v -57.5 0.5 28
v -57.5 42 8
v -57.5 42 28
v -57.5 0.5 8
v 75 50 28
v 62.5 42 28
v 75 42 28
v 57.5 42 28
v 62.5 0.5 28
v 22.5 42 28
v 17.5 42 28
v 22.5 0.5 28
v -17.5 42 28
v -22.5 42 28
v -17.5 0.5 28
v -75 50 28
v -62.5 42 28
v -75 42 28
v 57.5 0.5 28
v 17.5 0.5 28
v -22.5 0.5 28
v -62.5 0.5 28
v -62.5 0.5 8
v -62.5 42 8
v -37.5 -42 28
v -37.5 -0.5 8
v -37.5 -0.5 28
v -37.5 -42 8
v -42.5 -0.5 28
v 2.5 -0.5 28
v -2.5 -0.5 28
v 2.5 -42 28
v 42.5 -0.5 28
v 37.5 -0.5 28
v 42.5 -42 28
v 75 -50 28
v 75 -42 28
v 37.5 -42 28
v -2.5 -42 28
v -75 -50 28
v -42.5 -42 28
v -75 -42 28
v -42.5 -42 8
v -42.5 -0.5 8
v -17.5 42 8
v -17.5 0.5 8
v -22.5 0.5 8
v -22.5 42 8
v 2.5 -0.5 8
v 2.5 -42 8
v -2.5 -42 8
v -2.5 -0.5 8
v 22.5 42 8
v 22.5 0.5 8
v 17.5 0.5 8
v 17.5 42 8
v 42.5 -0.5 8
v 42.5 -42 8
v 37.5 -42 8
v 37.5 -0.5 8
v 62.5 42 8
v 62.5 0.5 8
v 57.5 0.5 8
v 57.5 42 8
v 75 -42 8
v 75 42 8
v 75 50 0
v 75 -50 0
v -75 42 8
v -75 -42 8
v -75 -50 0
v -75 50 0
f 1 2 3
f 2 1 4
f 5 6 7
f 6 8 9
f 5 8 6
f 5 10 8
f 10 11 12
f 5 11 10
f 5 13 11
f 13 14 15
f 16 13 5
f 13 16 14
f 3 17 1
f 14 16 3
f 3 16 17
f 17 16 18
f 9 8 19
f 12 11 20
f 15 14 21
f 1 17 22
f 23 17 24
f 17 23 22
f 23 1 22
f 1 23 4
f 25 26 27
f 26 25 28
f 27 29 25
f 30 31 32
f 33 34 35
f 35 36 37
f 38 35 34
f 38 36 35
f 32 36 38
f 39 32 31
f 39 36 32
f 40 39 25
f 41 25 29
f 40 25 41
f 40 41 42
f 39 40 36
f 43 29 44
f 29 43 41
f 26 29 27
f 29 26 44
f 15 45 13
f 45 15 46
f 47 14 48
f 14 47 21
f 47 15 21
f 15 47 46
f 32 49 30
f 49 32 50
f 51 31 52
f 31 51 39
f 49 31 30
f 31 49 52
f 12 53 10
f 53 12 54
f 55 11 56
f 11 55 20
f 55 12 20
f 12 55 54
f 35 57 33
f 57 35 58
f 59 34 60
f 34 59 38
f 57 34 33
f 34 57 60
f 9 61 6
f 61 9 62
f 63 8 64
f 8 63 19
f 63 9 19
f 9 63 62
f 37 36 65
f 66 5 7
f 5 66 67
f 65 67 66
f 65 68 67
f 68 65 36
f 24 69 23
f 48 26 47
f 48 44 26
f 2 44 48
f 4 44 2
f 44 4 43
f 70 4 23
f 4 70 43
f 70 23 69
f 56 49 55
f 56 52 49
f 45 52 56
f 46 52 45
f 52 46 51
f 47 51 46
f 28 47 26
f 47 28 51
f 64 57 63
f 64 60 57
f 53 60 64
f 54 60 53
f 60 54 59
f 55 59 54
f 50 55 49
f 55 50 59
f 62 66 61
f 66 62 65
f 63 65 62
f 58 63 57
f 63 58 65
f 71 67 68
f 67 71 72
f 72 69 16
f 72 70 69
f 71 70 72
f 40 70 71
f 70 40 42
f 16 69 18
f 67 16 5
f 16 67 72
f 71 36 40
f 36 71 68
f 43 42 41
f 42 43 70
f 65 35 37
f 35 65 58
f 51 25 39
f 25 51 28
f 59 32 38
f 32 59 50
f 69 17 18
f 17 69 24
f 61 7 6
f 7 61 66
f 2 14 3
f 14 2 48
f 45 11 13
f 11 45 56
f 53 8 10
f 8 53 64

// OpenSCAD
$fn = 32;

// ----------------------------------------------------------------------
// Rib frame 150 x 100 x 28
// 7 ribs at 20 mm pitch, staggered
// ----------------------------------------------------------------------

// --- parameters (mm) ---
frame = [150, 100, 8];  // base plate size (x, y, z)
rail_w = 8;             // side rail width
ribs = 7;               // number of ribs
rib_t = 5;              // rib thickness
rib_h = 20;             // rib height above the base plate
pitch = 20;             // pitch between rib centres

// --- derived feature positions (mm) ---
span = (ribs - 1) * pitch;          // = 120   distance between the outer ribs
origin_x = -span / 2;               // = -60   X of the first rib
rib_len = frame[1] / 2 - rail_w + 0.5;  // = 42.5   length of a staggered rib
rib_y = 0.5 + rib_len / 2;          // = 21.75   Y of a staggered rib centre
row_offset = 2 * rib_y;             // = 43.5   distance between the two rows
feature_centers = [
  [origin_x + 0 * pitch, rib_y],
  [origin_x + 1 * pitch, -rib_y],
  [origin_x + 2 * pitch, rib_y],
  [origin_x + 3 * pitch, -rib_y],
  [origin_x + 4 * pitch, rib_y],
  [origin_x + 5 * pitch, -rib_y],
  [origin_x + 6 * pitch, rib_y]
];   // rib centre line, drives the rib loop

// base plate, two side rails, then the ribs read straight off feature_centers
union() {
  translate([-frame[0] / 2, -frame[1] / 2, 0]) cube(frame);
  translate([-frame[0] / 2, -frame[1] / 2, 0]) cube([frame[0], rail_w, frame[2] + rib_h]);
  translate([-frame[0] / 2, frame[1] / 2 - rail_w, 0]) cube([frame[0], rail_w, frame[2] + rib_h]);
  for (centre = feature_centers)
    translate([centre[0] - rib_t / 2, centre[1] - rib_len / 2, frame[2] - 1])
      cube([rib_t, rib_len, rib_h + 1]);
}
